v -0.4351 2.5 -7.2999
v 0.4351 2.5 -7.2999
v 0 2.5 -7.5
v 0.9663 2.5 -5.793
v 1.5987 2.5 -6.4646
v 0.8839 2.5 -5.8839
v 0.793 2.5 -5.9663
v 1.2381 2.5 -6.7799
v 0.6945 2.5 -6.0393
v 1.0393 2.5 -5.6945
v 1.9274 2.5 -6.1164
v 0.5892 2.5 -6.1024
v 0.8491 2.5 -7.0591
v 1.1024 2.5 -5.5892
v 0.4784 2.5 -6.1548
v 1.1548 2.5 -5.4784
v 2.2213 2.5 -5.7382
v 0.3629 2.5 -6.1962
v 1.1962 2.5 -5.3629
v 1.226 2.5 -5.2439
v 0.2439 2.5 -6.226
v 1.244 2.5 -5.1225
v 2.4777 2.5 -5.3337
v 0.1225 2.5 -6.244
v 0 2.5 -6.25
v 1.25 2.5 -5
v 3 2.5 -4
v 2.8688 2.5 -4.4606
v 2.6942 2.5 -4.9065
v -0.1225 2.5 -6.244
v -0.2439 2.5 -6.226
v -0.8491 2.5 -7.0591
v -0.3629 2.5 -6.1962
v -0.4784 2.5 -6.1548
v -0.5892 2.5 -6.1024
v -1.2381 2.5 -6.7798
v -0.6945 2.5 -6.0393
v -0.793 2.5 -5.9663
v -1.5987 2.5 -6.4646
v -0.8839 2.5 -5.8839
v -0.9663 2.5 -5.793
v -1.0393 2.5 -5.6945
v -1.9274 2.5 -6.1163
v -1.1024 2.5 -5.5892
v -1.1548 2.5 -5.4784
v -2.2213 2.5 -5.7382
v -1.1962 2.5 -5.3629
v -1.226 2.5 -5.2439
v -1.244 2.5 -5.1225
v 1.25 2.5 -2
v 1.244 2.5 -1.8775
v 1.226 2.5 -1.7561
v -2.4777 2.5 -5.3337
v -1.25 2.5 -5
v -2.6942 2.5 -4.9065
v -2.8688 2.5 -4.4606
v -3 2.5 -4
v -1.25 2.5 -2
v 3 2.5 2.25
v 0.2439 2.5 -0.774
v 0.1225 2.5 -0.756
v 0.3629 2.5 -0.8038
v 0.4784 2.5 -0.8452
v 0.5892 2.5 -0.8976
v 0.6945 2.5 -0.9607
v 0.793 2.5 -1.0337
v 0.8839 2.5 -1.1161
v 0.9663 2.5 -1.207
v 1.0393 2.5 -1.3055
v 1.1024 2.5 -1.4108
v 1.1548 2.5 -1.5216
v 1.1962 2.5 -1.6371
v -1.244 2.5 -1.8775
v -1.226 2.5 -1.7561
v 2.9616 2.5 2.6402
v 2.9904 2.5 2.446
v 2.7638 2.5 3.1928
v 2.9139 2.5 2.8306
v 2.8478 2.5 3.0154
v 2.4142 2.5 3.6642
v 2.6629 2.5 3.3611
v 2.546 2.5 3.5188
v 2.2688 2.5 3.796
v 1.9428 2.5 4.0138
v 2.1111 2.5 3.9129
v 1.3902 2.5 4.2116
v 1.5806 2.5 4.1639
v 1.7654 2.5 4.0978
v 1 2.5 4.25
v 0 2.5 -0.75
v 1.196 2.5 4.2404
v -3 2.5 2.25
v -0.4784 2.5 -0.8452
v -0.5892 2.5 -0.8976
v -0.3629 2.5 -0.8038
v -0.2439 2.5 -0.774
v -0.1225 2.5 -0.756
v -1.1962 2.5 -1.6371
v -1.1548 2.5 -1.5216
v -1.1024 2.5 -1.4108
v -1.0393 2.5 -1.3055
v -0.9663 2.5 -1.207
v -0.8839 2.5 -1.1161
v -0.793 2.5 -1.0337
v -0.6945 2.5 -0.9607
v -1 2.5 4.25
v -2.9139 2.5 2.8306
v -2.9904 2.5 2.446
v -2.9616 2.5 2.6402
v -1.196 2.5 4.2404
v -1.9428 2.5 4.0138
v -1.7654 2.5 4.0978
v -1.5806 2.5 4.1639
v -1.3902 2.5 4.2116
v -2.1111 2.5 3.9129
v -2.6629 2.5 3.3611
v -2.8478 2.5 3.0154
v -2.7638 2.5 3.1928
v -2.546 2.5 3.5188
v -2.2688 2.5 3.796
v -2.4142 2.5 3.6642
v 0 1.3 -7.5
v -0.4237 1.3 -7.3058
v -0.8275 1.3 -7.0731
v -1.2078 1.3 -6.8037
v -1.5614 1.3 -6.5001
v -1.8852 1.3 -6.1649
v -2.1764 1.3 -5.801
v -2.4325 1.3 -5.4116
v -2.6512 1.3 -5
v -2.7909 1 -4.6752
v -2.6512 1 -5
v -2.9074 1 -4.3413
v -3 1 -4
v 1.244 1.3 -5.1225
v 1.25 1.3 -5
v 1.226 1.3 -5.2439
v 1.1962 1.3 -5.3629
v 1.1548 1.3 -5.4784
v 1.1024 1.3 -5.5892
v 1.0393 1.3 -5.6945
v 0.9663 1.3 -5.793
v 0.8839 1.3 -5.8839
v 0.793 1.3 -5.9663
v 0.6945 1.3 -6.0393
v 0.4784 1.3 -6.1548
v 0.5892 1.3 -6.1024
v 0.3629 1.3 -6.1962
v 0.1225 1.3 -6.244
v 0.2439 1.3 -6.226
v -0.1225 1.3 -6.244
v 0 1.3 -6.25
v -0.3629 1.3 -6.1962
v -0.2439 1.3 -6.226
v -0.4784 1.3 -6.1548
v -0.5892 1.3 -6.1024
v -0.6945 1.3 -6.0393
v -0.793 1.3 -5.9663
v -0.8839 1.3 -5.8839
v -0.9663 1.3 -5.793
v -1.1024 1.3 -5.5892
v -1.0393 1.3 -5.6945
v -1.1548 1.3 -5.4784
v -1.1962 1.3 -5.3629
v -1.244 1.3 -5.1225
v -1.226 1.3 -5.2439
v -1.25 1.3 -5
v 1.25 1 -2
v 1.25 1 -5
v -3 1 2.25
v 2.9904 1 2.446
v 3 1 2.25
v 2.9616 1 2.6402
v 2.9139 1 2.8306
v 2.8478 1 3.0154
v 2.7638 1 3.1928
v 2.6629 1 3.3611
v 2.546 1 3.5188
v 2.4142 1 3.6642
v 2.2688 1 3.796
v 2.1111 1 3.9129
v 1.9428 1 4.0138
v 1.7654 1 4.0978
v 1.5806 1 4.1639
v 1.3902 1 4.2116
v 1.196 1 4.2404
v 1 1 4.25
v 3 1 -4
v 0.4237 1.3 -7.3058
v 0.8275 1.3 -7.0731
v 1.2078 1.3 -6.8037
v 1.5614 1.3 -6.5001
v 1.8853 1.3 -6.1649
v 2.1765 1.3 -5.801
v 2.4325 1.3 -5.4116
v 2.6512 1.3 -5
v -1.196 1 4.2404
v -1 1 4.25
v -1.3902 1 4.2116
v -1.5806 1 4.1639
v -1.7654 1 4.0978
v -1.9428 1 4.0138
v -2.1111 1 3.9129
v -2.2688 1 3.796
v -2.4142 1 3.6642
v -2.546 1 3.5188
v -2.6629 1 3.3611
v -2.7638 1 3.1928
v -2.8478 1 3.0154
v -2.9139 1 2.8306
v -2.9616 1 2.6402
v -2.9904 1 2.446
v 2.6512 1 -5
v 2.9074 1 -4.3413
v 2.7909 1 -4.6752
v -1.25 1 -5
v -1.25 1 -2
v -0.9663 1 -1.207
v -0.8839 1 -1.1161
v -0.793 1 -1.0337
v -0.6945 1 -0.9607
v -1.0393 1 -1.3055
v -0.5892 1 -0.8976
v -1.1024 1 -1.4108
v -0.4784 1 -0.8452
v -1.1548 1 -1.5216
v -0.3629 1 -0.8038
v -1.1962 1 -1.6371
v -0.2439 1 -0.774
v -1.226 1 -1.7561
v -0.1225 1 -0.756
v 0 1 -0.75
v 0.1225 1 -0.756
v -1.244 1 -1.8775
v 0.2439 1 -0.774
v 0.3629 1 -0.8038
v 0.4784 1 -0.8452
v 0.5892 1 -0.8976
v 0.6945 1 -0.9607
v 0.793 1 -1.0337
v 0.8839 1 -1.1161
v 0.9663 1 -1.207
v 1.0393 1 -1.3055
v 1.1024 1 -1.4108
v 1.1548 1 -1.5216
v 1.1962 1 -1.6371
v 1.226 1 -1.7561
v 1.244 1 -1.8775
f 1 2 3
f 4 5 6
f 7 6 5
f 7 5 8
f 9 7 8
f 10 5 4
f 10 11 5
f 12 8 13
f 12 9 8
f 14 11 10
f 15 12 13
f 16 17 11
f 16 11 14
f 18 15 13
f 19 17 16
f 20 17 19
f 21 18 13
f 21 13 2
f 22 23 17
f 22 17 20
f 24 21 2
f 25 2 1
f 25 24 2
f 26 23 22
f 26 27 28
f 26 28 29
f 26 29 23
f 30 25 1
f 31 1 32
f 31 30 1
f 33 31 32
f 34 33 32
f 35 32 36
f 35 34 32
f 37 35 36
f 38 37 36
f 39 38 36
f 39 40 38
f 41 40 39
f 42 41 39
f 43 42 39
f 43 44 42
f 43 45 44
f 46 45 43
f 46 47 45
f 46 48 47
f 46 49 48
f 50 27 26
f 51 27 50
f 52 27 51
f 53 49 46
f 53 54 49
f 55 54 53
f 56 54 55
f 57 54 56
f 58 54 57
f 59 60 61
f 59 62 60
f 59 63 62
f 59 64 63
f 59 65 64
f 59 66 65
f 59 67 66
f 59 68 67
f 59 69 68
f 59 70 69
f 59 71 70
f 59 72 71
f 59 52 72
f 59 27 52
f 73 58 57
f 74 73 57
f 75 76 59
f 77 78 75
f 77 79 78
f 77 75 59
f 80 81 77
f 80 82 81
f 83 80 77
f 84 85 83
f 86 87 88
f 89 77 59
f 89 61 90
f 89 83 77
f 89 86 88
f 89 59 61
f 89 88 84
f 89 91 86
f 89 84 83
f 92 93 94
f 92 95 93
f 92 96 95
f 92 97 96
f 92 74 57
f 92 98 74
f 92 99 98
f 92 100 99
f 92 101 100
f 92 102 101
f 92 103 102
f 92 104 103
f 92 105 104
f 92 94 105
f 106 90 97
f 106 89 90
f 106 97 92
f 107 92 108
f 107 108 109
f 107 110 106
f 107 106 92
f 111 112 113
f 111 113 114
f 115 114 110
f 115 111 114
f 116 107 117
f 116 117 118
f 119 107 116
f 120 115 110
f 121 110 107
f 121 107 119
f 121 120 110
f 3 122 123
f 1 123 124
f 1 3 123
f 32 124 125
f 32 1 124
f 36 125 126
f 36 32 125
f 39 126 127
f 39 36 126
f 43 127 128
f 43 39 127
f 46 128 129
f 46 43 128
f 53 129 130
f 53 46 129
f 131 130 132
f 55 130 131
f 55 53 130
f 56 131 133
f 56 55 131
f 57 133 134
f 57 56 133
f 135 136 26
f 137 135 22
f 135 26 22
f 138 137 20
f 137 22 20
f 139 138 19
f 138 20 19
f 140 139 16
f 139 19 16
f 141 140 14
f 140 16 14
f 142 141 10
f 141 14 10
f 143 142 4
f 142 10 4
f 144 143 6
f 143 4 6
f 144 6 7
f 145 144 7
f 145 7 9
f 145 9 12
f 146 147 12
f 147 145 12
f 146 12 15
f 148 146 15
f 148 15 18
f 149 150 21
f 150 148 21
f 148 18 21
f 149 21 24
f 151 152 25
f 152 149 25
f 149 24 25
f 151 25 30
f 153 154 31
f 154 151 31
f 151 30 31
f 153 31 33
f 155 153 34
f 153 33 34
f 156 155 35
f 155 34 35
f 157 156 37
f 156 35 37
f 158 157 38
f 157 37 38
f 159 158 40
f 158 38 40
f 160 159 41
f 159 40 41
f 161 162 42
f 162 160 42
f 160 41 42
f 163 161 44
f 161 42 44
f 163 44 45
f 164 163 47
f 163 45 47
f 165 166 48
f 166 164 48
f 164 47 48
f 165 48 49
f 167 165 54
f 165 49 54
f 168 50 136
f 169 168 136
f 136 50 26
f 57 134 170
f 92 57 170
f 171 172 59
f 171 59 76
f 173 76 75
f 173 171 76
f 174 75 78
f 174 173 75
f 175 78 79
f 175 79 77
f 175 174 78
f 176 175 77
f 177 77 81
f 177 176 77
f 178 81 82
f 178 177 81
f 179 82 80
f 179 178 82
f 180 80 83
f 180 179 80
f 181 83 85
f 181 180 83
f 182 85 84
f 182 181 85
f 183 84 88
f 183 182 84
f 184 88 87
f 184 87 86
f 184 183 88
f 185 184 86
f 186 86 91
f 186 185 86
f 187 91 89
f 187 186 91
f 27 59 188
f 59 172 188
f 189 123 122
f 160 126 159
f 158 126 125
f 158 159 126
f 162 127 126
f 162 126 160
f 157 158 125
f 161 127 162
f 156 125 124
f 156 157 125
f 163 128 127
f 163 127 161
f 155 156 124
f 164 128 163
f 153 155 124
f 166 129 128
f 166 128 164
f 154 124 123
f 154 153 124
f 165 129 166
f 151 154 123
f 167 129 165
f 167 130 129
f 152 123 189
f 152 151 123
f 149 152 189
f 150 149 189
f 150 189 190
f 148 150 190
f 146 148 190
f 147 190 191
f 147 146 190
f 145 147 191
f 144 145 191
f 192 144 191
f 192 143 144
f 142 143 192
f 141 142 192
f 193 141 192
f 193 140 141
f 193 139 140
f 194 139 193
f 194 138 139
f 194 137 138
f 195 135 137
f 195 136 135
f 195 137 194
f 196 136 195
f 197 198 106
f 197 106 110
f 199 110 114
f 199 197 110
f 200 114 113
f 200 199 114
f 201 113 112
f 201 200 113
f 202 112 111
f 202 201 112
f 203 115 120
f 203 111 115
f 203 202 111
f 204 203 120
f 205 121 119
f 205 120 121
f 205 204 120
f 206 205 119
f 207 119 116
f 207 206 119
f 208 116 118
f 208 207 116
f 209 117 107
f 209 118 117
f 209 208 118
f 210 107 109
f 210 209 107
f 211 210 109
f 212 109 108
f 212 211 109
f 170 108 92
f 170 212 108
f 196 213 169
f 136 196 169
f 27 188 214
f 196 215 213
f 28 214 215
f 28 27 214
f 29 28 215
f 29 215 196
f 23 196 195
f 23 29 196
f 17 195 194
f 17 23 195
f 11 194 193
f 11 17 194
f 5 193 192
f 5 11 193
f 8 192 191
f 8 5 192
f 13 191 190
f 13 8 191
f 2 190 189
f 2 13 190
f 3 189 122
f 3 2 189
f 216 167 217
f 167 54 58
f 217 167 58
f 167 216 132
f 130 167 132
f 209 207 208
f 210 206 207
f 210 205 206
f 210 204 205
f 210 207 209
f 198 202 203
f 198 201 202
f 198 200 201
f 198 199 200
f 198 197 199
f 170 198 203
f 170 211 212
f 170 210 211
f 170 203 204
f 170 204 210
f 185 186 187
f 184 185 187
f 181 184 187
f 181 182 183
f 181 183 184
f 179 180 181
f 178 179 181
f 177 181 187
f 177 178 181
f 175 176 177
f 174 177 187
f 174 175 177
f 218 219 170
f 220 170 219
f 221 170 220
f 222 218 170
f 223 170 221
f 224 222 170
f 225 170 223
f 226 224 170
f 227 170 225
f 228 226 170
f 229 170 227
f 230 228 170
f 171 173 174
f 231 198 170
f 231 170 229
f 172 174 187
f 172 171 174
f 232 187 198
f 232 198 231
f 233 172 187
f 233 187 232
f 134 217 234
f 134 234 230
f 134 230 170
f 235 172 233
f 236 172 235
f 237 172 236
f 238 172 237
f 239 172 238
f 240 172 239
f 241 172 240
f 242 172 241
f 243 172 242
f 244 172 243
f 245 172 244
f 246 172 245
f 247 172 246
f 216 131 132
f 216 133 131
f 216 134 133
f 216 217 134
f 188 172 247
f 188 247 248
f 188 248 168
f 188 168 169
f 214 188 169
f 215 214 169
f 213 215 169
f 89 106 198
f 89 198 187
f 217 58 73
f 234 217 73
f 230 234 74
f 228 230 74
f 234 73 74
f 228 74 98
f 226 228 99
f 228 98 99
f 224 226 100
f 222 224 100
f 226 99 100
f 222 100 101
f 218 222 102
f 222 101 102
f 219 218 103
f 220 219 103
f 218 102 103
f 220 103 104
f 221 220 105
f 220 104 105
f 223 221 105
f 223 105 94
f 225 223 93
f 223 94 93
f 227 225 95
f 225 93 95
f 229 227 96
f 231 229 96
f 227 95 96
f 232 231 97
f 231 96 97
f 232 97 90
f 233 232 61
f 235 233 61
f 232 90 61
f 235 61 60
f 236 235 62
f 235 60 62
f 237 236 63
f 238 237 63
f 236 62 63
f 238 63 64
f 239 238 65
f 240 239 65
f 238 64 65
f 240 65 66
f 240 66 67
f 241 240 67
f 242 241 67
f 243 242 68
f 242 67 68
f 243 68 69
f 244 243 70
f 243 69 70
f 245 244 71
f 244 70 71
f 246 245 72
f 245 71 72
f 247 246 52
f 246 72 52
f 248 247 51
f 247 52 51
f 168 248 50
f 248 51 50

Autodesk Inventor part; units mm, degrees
ref_plane "YZ Plane" through (0, 0, 0) normal (1, 0, 0) x (0, 1, 0)
ref_plane "XZ Plane" through (0, 0, 0) normal (0, 1, 0) x (-1, 0, 0)
ref_plane "XY Plane" through (0, 0, 0) normal (0, 0, 1) x (1, 0, 0)
sketch "Sketch1" plane through (0, 0, 0) normal (0, 1, 0) x (-1, 0, 0)
  line L0 (-3, -8) -> (3, -8)
  line L1 (3, -8) -> (3, 8)
  line L2 (3, 8) -> (-3, 8)
  line L3 (-3, 8) -> (-3, -8)
  line L4 (-3, -8) -> (3, 8) construction
  line L5 (3, -8) -> (-3, 8) construction
  point P0 (0, 0)
  dimension "d0" = 16
  dimension "d1" = 6
extrude "Extrusion1" add sketch "Sketch1" along normal blind 2.5
sketch "Sketch2" plane through (0, 2.5, 0) normal (0, 1, 0) x (1, 0, 0)
  line L0 (0, 5) -> (0, 2) construction
  line L1 (-1.25, 5) -> (-1.25, 2)
  line L2 (1.25, 2) -> (1.25, 5)
  arc A0 (1.25, 5) -> (-1.25, 5) centre (0, 5) ccw
  arc A1 (-1.25, 2) -> (1.25, 2) centre (0, 2) ccw
  line L3 (-3, -8) -> (3, -8) projected
  line L4 (-3, 8) -> (-3, -8) projected
  line L5 (-3, -8) -> (3, -8) projected
  line L6 (3, -8) -> (3, 8) projected
  line L7 (3, 8) -> (-3, 8) projected
  point P0 (0, 3.5)
  point P1 (0, 3.5)
  dimension "d4" = 2.5
  dimension "d7" = 6
  dimension "d8" = 3
  dimension "d9" = 3
  dimension "d28" = 3
extrude "Extrusion2" cut sketch "Sketch2" against normal through all contours A0 L2 A1 L1
sketch "Sketch3" plane through (3, 0, 8) normal (1, 0, 0) x (0, 0, -1)
  line L0 (16, 0) -> (0, 0) projected
  line L1 (16, 0) -> (2, 0)
  line L2 (2, 0) -> (2, 1)
  line L3 (2, 1) -> (16, 1)
  line L4 (16, 1) -> (16, 0)
  line L5 (0, 0) -> (0, 2.5) projected
  line L6 (0, 2.5) -> (16, 2.5) projected
  point P0 (8, 0)
  point P1 (2, 0)
  dimension "d12" = 2
  dimension "d13" = 1.5
extrude "Extrusion3" cut sketch "Sketch3" against normal through all
sketch "Sketch4" plane through (0, 2.5, 0) normal (0, 1, 0) x (1, 0, 0)
  line L0 (-3, 8) -> (-3, -8) projected
  line L1 (3, -8) -> (3, 8) projected
  arc A0 (-3, -6) -> (3, -6) centre (0, -4.75) ccw
  line L2 (-3, -8) -> (3, -8) projected
  point P0 (0, 0)
  point P1 (-2, 6)
  point P2 (2, 6)
  point P3 (3, 8)
  point P4 (0, -8)
  point P5 (-2.2361, -8)
  dimension "d17" = 2
extrude "Extrusion4" cut sketch "Sketch4" against normal through all
sketch "Sketch5" plane through (0, 2.5, 0) normal (0, 1, 0) x (1, 0, 0)
  line L0 (3, -6) -> (3, 8) projected
  line L1 (3, 8) -> (-3, 8) projected
  line L2 (-3, 8) -> (-3, -6) projected
  arc A0 (1.25, 5) -> (-1.25, 5) centre (0, 5) ccw projected
  arc A1 (3, 4) -> (0, 7.5) centre (-1.8689, 2.8624) ccw
  arc A2 (0, 7.5) -> (-3, 4) centre (1.8689, 2.8624) ccw
  point P0 (0, 0)
  point P1 (-3, 6.2041)
  point P2 (0, 6.25)
  point P3 (0, 6.25)
  dimension "d23" = 5
  dimension "d24" = 4
  dimension "d25" = 0.5
extrude "Extrusion5" cut sketch "Sketch5" against normal through all
sketch "Sketch6" plane through (-3, 1, 6) normal (0, -1, 0) x (1, 0, 0)
  line L0 (6.1469, -11) -> (-0.0299, -11)
  line L1 (-0.0299, -11) -> (-0.0299, -13.5)
  line L2 (-0.0299, -13.5) -> (6.1469, -13.5)
  line L3 (6.1469, -13.5) -> (6.1469, -11)
  arc A0 (1.75, -11) -> (4.25, -11) centre (3, -11) ccw projected
  point P0 (3, -6)
  point P1 (3, -13.5)
  point P2 (1.75, -11)
extrude "Extrusion6" cut sketch "Sketch6" against normal blind 0.3 contours L3 L2 L1 L0 A0
sketch "Sketch7" plane through (0, 2.5, 0) normal (0, 1, 0) x (1, 0, 0)
  line L0 (3, -6) -> (3, 4) projected
  line L1 (-3, 4) -> (-3, -6) projected
  line L2 (-3, -4.25) -> (3, -4.25)
  arc A0 (-1.25, 2) -> (1.25, 2) centre (0, 2) ccw projected
  arc A1 (-3, -6) -> (3, -6) centre (0, -4.75) ccw projected
  point P0 (0, 0)
  point P1 (0, 0.75)
  dimension "d29" = 5
extrude "Extrusion7" cut sketch "Sketch7" against normal through all
fillet "Fillet2" radius 2 2 edges at (3, 1.75, 4.25) (-3, 1.75, 4.25)
equation "\"d8\" = 0.5 * d7"
properties part number "Carrier Tab V2"
